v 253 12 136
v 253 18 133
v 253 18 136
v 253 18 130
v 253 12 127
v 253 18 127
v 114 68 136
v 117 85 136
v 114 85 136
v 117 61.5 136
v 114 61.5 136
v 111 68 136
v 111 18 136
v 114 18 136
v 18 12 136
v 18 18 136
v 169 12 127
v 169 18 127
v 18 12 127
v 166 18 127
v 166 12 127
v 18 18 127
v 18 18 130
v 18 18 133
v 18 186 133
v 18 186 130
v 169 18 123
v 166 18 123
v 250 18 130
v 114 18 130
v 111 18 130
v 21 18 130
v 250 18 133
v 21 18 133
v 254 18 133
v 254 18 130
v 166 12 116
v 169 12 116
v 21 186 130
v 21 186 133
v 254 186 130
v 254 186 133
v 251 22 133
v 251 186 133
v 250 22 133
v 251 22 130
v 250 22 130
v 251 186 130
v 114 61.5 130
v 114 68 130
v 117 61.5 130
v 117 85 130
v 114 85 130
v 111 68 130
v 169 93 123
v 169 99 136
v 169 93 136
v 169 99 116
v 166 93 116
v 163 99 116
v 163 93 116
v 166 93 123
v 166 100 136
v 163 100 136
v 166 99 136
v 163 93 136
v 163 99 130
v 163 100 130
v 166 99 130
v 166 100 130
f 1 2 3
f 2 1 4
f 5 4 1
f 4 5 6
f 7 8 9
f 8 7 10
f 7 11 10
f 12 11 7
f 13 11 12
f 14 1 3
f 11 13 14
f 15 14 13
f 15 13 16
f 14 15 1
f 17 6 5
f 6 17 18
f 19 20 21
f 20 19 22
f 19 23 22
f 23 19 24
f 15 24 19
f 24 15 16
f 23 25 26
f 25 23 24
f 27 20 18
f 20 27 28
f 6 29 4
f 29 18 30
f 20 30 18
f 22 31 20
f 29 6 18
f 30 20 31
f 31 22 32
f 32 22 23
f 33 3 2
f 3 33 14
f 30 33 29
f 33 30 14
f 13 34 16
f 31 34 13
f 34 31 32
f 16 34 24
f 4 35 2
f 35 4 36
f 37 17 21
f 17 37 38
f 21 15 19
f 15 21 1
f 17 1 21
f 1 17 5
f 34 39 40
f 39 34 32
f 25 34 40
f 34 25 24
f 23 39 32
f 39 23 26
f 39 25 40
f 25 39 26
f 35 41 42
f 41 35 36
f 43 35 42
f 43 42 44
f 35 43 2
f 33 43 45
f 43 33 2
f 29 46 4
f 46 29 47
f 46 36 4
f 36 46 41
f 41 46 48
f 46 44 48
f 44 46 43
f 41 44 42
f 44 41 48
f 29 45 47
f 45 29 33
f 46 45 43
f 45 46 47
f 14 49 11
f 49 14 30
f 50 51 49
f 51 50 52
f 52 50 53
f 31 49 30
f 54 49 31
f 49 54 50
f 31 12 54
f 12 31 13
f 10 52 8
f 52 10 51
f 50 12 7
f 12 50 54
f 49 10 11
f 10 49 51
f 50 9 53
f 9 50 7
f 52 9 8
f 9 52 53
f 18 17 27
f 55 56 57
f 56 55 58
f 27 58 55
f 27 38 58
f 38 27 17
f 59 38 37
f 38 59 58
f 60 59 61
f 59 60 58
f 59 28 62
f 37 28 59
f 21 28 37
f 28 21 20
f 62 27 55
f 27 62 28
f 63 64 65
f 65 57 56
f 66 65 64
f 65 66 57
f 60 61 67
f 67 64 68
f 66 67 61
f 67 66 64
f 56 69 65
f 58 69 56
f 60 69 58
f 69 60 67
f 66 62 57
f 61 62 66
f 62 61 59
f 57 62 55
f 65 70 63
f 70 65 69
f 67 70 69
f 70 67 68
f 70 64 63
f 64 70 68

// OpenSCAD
// Original D7 SHA256 20ee6d8c001ee16d64e47edb5456eff3bc39f3390a85dd94b69b7eb1504d878f
// Review only; source D7 solids not embedded; physical assembly unqualified.
color([0.05,0.28,0.44]) translate([18,12,127])cube([235,6,9]); // FRONT_CROSSBAR
color([0.05,0.28,0.44]) translate([18,18,130])cube([3,168,3]); // SIDE_FRAME_LEFT
color([0.05,0.28,0.44]) translate([251,18,130])cube([3,168,3]); // SIDE_FRAME_RIGHT
color([0.05,0.28,0.44]) translate([18,16,130])cube([3,6,3]); // FRONT_LEFT_FRAME_COUPLER
color([0.05,0.28,0.44]) translate([250,16,130])cube([3,6,3]); // FRONT_RIGHT_FRAME_COUPLER
color([0.03,0.57,0.55]) translate([111,17,130])cube([3,46,6]); // LEFT_FRONT_WEB
color([0.03,0.57,0.55]) translate([111,61.5,130])cube([6,6.5,6]); // LEFT_JOG
color([0.03,0.57,0.55]) translate([114,66,130])cube([3,19,6]); // LEFT_TO_G5_GUIDE
color([0.71,0.33,0.44]) translate([166,12,116])cube([3,6,20]); // RIGHT_ROOT_Z_RISER
color([0.71,0.33,0.44]) translate([166,17,116])cube([3,73,7]); // RIGHT_LOWER_WEB
color([0.71,0.33,0.44]) translate([166,89,116])cube([3,6,7]); // RIGHT_LOWER_TO_TIP
color([0.71,0.33,0.44]) translate([163,93,116])cube([6,6,20]); // RIGHT_REAR_Z_RISER
color([0.71,0.33,0.44]) translate([163,95,130])cube([3,5,6]); // RIGHT_TO_G5_GUIDE
